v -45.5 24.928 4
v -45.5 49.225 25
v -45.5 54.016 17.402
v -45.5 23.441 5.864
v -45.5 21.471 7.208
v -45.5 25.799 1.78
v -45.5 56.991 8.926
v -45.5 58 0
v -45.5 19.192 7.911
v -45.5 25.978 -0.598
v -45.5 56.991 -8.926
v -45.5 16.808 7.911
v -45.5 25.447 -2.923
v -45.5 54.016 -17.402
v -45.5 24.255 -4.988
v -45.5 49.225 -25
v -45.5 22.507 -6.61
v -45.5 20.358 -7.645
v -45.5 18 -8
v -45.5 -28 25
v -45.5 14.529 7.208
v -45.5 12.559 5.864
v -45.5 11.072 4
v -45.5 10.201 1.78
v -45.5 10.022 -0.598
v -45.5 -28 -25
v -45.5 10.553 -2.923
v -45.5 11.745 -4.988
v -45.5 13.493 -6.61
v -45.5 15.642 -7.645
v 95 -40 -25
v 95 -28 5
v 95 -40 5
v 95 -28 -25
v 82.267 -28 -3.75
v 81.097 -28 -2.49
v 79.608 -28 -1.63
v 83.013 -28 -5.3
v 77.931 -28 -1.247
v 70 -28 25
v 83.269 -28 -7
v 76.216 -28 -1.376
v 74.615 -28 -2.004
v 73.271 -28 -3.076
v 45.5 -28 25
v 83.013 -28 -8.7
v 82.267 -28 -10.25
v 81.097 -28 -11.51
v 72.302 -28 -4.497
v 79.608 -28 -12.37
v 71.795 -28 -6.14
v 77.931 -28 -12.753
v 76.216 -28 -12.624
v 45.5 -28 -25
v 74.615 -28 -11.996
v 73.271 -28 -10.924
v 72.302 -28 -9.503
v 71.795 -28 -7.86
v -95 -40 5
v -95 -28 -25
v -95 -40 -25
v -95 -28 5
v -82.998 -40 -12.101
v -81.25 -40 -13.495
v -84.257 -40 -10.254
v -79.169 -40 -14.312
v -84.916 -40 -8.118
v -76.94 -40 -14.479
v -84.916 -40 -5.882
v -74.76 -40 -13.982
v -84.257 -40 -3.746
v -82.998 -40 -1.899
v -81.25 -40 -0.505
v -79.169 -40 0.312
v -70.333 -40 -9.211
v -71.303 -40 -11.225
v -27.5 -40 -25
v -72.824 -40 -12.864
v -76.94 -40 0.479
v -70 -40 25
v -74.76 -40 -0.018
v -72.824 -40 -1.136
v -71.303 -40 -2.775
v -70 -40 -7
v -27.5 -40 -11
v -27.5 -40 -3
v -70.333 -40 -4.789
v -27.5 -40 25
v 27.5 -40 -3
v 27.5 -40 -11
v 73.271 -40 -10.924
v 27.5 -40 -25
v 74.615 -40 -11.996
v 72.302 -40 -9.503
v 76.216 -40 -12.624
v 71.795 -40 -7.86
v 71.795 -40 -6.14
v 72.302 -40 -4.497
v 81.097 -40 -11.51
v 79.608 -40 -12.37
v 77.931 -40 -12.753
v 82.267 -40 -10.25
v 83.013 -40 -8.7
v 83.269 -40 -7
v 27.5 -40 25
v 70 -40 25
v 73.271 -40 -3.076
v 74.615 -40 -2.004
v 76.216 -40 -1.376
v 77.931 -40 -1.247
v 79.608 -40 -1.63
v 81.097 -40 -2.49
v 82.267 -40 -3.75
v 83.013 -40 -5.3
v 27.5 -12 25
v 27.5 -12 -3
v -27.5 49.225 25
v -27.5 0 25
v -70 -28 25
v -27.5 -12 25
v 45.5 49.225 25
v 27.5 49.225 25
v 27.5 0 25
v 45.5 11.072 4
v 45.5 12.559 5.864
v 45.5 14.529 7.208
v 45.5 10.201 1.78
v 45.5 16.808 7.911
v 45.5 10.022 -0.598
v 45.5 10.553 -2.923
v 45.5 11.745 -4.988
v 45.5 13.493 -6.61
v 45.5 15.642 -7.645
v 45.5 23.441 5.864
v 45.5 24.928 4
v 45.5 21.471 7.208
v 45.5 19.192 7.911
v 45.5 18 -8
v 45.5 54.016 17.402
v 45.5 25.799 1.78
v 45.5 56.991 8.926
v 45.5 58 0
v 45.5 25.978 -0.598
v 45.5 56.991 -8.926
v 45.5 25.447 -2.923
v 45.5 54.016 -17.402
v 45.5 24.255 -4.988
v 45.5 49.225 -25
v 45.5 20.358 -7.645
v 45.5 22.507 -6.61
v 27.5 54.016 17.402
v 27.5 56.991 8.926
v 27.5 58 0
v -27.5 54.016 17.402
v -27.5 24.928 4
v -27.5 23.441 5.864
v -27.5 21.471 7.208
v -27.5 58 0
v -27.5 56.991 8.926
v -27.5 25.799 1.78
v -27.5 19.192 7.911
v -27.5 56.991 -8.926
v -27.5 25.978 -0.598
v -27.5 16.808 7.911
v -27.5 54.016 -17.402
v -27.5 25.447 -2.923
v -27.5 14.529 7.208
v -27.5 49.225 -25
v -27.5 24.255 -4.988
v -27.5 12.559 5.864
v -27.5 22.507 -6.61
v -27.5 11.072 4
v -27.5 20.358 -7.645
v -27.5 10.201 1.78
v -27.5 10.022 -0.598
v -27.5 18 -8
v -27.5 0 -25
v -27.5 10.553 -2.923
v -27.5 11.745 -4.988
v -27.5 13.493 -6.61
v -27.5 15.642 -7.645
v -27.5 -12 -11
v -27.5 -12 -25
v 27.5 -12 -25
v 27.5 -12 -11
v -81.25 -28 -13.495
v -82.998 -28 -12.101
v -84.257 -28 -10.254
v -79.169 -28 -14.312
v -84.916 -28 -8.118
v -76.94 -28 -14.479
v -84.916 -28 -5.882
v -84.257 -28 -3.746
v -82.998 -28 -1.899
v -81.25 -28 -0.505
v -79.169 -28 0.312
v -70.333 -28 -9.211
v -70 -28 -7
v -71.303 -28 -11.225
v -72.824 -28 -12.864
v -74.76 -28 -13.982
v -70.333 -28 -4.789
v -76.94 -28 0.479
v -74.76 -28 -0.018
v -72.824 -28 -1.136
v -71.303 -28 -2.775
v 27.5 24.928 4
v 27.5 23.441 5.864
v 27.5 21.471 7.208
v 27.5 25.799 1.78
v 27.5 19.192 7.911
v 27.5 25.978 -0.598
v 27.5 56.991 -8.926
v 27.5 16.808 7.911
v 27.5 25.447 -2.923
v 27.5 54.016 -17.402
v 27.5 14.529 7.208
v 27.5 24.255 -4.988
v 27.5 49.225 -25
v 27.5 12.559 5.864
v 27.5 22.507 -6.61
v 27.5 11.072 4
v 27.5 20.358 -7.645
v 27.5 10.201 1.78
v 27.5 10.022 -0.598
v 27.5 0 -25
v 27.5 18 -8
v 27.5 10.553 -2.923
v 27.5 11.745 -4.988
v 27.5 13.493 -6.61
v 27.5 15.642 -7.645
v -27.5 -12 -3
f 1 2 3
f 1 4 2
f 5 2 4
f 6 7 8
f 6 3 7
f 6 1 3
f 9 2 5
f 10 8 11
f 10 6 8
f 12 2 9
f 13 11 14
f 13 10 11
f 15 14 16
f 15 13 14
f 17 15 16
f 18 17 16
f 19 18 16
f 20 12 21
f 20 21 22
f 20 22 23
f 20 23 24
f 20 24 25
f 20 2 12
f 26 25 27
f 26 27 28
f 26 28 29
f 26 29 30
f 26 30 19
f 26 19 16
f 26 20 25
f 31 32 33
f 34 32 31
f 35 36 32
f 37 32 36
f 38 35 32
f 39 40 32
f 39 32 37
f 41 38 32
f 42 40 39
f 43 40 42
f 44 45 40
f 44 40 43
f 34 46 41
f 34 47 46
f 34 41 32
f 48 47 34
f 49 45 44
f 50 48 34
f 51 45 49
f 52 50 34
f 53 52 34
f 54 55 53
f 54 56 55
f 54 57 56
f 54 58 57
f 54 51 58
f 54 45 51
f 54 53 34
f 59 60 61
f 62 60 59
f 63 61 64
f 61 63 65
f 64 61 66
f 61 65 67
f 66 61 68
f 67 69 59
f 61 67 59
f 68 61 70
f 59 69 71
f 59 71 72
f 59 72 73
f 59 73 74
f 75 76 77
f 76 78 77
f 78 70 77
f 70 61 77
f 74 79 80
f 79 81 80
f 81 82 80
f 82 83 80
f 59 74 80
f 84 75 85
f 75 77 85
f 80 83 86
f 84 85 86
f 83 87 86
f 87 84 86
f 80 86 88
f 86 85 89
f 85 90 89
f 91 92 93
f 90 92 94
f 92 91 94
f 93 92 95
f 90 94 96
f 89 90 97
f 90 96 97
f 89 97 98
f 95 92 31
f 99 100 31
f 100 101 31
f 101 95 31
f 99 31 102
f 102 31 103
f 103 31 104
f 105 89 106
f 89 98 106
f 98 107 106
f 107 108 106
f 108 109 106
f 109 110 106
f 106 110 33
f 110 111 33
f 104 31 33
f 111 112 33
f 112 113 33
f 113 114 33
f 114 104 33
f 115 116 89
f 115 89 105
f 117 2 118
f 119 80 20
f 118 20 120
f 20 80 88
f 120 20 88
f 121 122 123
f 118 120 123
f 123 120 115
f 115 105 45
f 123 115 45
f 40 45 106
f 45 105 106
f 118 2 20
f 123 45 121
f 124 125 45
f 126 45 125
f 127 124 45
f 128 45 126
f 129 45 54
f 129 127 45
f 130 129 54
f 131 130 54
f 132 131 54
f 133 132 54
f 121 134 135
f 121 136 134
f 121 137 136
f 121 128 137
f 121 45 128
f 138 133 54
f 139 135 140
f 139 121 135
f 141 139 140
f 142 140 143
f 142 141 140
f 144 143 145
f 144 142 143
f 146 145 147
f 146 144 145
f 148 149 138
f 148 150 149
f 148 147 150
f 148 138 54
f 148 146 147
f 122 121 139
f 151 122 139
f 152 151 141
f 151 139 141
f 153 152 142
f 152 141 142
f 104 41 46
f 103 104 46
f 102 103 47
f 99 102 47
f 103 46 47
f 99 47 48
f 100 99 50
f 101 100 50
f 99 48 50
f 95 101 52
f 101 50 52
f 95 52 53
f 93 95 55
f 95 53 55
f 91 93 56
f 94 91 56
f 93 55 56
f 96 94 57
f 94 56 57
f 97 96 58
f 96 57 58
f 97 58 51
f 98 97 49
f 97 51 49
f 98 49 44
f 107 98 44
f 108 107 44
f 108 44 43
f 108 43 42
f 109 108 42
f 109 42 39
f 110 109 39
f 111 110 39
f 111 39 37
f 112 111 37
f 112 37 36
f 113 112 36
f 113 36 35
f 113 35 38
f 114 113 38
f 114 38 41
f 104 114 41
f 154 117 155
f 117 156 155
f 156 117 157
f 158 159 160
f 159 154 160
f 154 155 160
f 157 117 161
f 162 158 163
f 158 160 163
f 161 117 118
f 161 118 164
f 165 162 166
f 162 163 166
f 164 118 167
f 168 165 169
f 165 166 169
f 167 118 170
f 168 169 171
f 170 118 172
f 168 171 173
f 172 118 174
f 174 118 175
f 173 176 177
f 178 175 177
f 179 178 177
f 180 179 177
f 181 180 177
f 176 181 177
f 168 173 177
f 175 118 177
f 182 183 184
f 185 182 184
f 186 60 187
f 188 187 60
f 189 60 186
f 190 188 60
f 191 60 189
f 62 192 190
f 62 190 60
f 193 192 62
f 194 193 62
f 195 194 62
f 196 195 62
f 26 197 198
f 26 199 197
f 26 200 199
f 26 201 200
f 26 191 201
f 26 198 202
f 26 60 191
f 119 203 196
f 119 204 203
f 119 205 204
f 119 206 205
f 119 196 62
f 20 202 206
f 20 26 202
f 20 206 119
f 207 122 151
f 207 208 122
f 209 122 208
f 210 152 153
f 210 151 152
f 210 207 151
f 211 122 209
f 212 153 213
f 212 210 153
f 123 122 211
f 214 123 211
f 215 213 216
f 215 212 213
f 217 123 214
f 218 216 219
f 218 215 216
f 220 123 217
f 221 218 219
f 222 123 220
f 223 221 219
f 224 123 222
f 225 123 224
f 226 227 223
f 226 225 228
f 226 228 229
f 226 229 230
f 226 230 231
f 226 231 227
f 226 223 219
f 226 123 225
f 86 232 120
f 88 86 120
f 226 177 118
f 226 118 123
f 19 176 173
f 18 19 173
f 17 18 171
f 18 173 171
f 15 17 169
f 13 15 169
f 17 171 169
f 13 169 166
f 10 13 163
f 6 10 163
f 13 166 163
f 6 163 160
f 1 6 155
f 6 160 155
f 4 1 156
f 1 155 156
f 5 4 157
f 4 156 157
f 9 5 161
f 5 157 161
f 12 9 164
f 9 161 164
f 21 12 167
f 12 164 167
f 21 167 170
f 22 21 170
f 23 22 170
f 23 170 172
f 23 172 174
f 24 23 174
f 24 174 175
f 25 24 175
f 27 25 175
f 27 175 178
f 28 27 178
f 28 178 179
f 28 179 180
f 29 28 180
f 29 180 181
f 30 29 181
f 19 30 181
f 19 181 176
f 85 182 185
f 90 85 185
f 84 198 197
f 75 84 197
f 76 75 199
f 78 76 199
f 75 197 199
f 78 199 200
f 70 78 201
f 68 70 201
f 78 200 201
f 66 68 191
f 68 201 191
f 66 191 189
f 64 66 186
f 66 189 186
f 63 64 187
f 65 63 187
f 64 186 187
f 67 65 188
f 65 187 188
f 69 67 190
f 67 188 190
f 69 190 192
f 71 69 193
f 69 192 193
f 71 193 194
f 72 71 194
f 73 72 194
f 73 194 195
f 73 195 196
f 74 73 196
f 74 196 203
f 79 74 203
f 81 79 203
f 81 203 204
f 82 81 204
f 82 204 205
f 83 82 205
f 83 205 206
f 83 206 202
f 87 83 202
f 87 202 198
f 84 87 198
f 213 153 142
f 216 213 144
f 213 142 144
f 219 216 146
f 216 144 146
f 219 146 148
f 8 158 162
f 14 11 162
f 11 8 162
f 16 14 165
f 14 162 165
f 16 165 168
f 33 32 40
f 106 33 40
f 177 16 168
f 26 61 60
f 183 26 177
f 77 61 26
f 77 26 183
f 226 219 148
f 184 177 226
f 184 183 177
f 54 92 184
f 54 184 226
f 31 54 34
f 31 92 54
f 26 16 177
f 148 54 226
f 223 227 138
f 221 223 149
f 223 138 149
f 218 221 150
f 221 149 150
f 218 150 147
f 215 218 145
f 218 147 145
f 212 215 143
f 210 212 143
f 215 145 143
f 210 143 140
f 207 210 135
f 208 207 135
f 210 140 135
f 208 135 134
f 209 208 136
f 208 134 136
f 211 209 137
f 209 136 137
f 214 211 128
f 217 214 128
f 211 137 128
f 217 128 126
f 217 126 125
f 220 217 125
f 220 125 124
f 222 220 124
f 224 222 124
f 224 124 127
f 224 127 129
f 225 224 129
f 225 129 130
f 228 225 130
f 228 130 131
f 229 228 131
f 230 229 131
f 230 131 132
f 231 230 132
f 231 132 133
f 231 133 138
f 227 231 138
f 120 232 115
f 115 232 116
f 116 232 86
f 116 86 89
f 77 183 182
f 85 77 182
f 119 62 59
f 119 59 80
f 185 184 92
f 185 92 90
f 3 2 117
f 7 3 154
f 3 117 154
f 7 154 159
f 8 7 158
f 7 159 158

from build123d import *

# Parameters (mm, degrees)
SKETCH1_W               = 91
SKETCH1_H               = 50
BOSS_EXTRUDE1_DEPTH     = 12
SKETCH2_W               = 18
SKETCH2_H               = 50
BOSS_EXTRUDE2_DEPTH     = 28
SKETCH4_W               = 50
SKETCH4_H               = 12
BOSS_EXTRUDE3_DEPTH     = 49.5
SKETCH5_W               = 50
SKETCH5_H               = 12
BOSS_EXTRUDE4_DEPTH     = 49.5
CUT_EXTRUDE1_DEPTH      = 29
CUT_EXTRUDE1_DEPTH_BACK = 13
CUT_EXTRUDE2_DEPTH      = 29
CUT_EXTRUDE2_DEPTH_BACK = 13
SKETCH9_W               = 18
SKETCH9_H               = 50
BOSS_EXTRUDE5_DEPTH     = 58
SKETCH10_R              = 8
CUT_EXTRUDE3_DEPTH      = 50.5
CUT_EXTRUDE3_DEPTH_BACK = 141.5
SKETCH12_R              = 5.769053465
SKETCH12_R_2            = 7.5
CUT_EXTRUDE4_DEPTH      = 59
CUT_EXTRUDE4_DEPTH_BACK = 41
SKETCH15_W              = 55
SKETCH15_H              = 8
BOSS_EXTRUDE6_DEPTH     = 28


with BuildPart() as part:
    # Sketch1 → Boss-Extrude1 (new body)
    with BuildSketch(Plane(origin=(0, 0, 0), x_dir=(1, 0, 0), z_dir=(0, 1, 0))):
        Rectangle(SKETCH1_W, SKETCH1_H)
    extrude(amount=-BOSS_EXTRUDE1_DEPTH)

    # Sketch2 → Boss-Extrude2 (add)
    with BuildSketch(Plane.XZ.offset(12)):
        with Locations((-36.5, 0)):
            Rectangle(SKETCH2_W, SKETCH2_H)
        with Locations((36.5, 0)):
            Rectangle(SKETCH2_W, SKETCH2_H)
    extrude(amount=BOSS_EXTRUDE2_DEPTH)

    # Sketch4 → Boss-Extrude3 (add)
    with BuildSketch(Plane(origin=(45.5, 0, 0), x_dir=(0, 0, -1), z_dir=(1, 0, 0))):
        with Locations((0, -34)):
            Rectangle(SKETCH4_W, SKETCH4_H)
    extrude(amount=BOSS_EXTRUDE3_DEPTH)

    # Sketch5 → Boss-Extrude4 (add)
    with BuildSketch(Plane.ZY.offset(45.5)):
        with Locations((0, -34)):
            Rectangle(SKETCH5_W, SKETCH5_H)
    extrude(amount=BOSS_EXTRUDE4_DEPTH)

    # Sketch7 → Cut-Extrude1 (cut, two sides)
    with BuildSketch(Plane(origin=(0, -28, 0), x_dir=(1, 0, 0), z_dir=(0, 1, 0))) as cut_extrude1_sk:
        Polygon((95, -25), (95, -5), (70, -25), align=None)
    extrude(amount=CUT_EXTRUDE1_DEPTH, mode=Mode.SUBTRACT)
    extrude(cut_extrude1_sk.sketch, amount=-CUT_EXTRUDE1_DEPTH_BACK, mode=Mode.SUBTRACT)

    # Sketch8 → Cut-Extrude2 (cut, two sides)
    with BuildSketch(Plane(origin=(0, -28, 0), x_dir=(1, 0, 0), z_dir=(0, 1, 0))) as cut_extrude2_sk:
        Polygon((-95, -25), (-95, -5), (-70, -25), align=None)
    extrude(amount=CUT_EXTRUDE2_DEPTH, mode=Mode.SUBTRACT)
    extrude(cut_extrude2_sk.sketch, amount=-CUT_EXTRUDE2_DEPTH_BACK, mode=Mode.SUBTRACT)

    # Sketch9 → Boss-Extrude5 (add)
    with BuildSketch(Plane(origin=(0, 0, 0), x_dir=(1, 0, 0), z_dir=(0, 1, 0))):
        with Locations((-36.5, 0)):
            Rectangle(SKETCH9_W, SKETCH9_H)
        with Locations((36.5, 0)):
            Rectangle(SKETCH9_W, SKETCH9_H)
    extrude(amount=BOSS_EXTRUDE5_DEPTH)

    # Sketch10 → Cut-Extrude3 (cut, two sides)
    with BuildSketch(Plane(origin=(45.5, 0, 0), x_dir=(0, 0, -1), z_dir=(1, 0, 0))) as cut_extrude3_sk:
        with BuildLine():
            Line((25, 58), (0, 58))
            ThreePointArc((0, 58), (13.247648854, 55.742546282), (25, 49.224989992))
            Line((25, 49.224989992), (25, 58))
        make_face()
        with BuildLine():
            Line((-25, 58), (-25, 49.224989992))
            ThreePointArc((-25, 49.224989992), (-13.247648854, 55.742546282), (0, 58))
            Line((0, 58), (-25, 58))
        make_face()
        with Locations((0, 18)):
            Circle(SKETCH10_R)
    extrude(amount=CUT_EXTRUDE3_DEPTH, mode=Mode.SUBTRACT)
    extrude(cut_extrude3_sk.sketch, amount=-CUT_EXTRUDE3_DEPTH_BACK, mode=Mode.SUBTRACT)

    # Sketch12 → Cut-Extrude4 (cut, two sides)
    with BuildSketch(Plane(origin=(0, 0, 0), x_dir=(1, 0, 0), z_dir=(0, 1, 0))) as cut_extrude4_sk:
        with Locations((77.5, 7)):
            Circle(SKETCH12_R)
        with Locations((-77.5, 7)):
            Circle(SKETCH12_R_2)
    extrude(amount=CUT_EXTRUDE4_DEPTH, mode=Mode.SUBTRACT)
    extrude(cut_extrude4_sk.sketch, amount=-CUT_EXTRUDE4_DEPTH_BACK, mode=Mode.SUBTRACT)

    # Sketch15 → Boss-Extrude6 (add)
    with BuildSketch(Plane.XZ.offset(12)):
        with Locations((0, -7)):
            Rectangle(SKETCH15_W, SKETCH15_H)
    extrude(amount=BOSS_EXTRUDE6_DEPTH)


solid = part.part
